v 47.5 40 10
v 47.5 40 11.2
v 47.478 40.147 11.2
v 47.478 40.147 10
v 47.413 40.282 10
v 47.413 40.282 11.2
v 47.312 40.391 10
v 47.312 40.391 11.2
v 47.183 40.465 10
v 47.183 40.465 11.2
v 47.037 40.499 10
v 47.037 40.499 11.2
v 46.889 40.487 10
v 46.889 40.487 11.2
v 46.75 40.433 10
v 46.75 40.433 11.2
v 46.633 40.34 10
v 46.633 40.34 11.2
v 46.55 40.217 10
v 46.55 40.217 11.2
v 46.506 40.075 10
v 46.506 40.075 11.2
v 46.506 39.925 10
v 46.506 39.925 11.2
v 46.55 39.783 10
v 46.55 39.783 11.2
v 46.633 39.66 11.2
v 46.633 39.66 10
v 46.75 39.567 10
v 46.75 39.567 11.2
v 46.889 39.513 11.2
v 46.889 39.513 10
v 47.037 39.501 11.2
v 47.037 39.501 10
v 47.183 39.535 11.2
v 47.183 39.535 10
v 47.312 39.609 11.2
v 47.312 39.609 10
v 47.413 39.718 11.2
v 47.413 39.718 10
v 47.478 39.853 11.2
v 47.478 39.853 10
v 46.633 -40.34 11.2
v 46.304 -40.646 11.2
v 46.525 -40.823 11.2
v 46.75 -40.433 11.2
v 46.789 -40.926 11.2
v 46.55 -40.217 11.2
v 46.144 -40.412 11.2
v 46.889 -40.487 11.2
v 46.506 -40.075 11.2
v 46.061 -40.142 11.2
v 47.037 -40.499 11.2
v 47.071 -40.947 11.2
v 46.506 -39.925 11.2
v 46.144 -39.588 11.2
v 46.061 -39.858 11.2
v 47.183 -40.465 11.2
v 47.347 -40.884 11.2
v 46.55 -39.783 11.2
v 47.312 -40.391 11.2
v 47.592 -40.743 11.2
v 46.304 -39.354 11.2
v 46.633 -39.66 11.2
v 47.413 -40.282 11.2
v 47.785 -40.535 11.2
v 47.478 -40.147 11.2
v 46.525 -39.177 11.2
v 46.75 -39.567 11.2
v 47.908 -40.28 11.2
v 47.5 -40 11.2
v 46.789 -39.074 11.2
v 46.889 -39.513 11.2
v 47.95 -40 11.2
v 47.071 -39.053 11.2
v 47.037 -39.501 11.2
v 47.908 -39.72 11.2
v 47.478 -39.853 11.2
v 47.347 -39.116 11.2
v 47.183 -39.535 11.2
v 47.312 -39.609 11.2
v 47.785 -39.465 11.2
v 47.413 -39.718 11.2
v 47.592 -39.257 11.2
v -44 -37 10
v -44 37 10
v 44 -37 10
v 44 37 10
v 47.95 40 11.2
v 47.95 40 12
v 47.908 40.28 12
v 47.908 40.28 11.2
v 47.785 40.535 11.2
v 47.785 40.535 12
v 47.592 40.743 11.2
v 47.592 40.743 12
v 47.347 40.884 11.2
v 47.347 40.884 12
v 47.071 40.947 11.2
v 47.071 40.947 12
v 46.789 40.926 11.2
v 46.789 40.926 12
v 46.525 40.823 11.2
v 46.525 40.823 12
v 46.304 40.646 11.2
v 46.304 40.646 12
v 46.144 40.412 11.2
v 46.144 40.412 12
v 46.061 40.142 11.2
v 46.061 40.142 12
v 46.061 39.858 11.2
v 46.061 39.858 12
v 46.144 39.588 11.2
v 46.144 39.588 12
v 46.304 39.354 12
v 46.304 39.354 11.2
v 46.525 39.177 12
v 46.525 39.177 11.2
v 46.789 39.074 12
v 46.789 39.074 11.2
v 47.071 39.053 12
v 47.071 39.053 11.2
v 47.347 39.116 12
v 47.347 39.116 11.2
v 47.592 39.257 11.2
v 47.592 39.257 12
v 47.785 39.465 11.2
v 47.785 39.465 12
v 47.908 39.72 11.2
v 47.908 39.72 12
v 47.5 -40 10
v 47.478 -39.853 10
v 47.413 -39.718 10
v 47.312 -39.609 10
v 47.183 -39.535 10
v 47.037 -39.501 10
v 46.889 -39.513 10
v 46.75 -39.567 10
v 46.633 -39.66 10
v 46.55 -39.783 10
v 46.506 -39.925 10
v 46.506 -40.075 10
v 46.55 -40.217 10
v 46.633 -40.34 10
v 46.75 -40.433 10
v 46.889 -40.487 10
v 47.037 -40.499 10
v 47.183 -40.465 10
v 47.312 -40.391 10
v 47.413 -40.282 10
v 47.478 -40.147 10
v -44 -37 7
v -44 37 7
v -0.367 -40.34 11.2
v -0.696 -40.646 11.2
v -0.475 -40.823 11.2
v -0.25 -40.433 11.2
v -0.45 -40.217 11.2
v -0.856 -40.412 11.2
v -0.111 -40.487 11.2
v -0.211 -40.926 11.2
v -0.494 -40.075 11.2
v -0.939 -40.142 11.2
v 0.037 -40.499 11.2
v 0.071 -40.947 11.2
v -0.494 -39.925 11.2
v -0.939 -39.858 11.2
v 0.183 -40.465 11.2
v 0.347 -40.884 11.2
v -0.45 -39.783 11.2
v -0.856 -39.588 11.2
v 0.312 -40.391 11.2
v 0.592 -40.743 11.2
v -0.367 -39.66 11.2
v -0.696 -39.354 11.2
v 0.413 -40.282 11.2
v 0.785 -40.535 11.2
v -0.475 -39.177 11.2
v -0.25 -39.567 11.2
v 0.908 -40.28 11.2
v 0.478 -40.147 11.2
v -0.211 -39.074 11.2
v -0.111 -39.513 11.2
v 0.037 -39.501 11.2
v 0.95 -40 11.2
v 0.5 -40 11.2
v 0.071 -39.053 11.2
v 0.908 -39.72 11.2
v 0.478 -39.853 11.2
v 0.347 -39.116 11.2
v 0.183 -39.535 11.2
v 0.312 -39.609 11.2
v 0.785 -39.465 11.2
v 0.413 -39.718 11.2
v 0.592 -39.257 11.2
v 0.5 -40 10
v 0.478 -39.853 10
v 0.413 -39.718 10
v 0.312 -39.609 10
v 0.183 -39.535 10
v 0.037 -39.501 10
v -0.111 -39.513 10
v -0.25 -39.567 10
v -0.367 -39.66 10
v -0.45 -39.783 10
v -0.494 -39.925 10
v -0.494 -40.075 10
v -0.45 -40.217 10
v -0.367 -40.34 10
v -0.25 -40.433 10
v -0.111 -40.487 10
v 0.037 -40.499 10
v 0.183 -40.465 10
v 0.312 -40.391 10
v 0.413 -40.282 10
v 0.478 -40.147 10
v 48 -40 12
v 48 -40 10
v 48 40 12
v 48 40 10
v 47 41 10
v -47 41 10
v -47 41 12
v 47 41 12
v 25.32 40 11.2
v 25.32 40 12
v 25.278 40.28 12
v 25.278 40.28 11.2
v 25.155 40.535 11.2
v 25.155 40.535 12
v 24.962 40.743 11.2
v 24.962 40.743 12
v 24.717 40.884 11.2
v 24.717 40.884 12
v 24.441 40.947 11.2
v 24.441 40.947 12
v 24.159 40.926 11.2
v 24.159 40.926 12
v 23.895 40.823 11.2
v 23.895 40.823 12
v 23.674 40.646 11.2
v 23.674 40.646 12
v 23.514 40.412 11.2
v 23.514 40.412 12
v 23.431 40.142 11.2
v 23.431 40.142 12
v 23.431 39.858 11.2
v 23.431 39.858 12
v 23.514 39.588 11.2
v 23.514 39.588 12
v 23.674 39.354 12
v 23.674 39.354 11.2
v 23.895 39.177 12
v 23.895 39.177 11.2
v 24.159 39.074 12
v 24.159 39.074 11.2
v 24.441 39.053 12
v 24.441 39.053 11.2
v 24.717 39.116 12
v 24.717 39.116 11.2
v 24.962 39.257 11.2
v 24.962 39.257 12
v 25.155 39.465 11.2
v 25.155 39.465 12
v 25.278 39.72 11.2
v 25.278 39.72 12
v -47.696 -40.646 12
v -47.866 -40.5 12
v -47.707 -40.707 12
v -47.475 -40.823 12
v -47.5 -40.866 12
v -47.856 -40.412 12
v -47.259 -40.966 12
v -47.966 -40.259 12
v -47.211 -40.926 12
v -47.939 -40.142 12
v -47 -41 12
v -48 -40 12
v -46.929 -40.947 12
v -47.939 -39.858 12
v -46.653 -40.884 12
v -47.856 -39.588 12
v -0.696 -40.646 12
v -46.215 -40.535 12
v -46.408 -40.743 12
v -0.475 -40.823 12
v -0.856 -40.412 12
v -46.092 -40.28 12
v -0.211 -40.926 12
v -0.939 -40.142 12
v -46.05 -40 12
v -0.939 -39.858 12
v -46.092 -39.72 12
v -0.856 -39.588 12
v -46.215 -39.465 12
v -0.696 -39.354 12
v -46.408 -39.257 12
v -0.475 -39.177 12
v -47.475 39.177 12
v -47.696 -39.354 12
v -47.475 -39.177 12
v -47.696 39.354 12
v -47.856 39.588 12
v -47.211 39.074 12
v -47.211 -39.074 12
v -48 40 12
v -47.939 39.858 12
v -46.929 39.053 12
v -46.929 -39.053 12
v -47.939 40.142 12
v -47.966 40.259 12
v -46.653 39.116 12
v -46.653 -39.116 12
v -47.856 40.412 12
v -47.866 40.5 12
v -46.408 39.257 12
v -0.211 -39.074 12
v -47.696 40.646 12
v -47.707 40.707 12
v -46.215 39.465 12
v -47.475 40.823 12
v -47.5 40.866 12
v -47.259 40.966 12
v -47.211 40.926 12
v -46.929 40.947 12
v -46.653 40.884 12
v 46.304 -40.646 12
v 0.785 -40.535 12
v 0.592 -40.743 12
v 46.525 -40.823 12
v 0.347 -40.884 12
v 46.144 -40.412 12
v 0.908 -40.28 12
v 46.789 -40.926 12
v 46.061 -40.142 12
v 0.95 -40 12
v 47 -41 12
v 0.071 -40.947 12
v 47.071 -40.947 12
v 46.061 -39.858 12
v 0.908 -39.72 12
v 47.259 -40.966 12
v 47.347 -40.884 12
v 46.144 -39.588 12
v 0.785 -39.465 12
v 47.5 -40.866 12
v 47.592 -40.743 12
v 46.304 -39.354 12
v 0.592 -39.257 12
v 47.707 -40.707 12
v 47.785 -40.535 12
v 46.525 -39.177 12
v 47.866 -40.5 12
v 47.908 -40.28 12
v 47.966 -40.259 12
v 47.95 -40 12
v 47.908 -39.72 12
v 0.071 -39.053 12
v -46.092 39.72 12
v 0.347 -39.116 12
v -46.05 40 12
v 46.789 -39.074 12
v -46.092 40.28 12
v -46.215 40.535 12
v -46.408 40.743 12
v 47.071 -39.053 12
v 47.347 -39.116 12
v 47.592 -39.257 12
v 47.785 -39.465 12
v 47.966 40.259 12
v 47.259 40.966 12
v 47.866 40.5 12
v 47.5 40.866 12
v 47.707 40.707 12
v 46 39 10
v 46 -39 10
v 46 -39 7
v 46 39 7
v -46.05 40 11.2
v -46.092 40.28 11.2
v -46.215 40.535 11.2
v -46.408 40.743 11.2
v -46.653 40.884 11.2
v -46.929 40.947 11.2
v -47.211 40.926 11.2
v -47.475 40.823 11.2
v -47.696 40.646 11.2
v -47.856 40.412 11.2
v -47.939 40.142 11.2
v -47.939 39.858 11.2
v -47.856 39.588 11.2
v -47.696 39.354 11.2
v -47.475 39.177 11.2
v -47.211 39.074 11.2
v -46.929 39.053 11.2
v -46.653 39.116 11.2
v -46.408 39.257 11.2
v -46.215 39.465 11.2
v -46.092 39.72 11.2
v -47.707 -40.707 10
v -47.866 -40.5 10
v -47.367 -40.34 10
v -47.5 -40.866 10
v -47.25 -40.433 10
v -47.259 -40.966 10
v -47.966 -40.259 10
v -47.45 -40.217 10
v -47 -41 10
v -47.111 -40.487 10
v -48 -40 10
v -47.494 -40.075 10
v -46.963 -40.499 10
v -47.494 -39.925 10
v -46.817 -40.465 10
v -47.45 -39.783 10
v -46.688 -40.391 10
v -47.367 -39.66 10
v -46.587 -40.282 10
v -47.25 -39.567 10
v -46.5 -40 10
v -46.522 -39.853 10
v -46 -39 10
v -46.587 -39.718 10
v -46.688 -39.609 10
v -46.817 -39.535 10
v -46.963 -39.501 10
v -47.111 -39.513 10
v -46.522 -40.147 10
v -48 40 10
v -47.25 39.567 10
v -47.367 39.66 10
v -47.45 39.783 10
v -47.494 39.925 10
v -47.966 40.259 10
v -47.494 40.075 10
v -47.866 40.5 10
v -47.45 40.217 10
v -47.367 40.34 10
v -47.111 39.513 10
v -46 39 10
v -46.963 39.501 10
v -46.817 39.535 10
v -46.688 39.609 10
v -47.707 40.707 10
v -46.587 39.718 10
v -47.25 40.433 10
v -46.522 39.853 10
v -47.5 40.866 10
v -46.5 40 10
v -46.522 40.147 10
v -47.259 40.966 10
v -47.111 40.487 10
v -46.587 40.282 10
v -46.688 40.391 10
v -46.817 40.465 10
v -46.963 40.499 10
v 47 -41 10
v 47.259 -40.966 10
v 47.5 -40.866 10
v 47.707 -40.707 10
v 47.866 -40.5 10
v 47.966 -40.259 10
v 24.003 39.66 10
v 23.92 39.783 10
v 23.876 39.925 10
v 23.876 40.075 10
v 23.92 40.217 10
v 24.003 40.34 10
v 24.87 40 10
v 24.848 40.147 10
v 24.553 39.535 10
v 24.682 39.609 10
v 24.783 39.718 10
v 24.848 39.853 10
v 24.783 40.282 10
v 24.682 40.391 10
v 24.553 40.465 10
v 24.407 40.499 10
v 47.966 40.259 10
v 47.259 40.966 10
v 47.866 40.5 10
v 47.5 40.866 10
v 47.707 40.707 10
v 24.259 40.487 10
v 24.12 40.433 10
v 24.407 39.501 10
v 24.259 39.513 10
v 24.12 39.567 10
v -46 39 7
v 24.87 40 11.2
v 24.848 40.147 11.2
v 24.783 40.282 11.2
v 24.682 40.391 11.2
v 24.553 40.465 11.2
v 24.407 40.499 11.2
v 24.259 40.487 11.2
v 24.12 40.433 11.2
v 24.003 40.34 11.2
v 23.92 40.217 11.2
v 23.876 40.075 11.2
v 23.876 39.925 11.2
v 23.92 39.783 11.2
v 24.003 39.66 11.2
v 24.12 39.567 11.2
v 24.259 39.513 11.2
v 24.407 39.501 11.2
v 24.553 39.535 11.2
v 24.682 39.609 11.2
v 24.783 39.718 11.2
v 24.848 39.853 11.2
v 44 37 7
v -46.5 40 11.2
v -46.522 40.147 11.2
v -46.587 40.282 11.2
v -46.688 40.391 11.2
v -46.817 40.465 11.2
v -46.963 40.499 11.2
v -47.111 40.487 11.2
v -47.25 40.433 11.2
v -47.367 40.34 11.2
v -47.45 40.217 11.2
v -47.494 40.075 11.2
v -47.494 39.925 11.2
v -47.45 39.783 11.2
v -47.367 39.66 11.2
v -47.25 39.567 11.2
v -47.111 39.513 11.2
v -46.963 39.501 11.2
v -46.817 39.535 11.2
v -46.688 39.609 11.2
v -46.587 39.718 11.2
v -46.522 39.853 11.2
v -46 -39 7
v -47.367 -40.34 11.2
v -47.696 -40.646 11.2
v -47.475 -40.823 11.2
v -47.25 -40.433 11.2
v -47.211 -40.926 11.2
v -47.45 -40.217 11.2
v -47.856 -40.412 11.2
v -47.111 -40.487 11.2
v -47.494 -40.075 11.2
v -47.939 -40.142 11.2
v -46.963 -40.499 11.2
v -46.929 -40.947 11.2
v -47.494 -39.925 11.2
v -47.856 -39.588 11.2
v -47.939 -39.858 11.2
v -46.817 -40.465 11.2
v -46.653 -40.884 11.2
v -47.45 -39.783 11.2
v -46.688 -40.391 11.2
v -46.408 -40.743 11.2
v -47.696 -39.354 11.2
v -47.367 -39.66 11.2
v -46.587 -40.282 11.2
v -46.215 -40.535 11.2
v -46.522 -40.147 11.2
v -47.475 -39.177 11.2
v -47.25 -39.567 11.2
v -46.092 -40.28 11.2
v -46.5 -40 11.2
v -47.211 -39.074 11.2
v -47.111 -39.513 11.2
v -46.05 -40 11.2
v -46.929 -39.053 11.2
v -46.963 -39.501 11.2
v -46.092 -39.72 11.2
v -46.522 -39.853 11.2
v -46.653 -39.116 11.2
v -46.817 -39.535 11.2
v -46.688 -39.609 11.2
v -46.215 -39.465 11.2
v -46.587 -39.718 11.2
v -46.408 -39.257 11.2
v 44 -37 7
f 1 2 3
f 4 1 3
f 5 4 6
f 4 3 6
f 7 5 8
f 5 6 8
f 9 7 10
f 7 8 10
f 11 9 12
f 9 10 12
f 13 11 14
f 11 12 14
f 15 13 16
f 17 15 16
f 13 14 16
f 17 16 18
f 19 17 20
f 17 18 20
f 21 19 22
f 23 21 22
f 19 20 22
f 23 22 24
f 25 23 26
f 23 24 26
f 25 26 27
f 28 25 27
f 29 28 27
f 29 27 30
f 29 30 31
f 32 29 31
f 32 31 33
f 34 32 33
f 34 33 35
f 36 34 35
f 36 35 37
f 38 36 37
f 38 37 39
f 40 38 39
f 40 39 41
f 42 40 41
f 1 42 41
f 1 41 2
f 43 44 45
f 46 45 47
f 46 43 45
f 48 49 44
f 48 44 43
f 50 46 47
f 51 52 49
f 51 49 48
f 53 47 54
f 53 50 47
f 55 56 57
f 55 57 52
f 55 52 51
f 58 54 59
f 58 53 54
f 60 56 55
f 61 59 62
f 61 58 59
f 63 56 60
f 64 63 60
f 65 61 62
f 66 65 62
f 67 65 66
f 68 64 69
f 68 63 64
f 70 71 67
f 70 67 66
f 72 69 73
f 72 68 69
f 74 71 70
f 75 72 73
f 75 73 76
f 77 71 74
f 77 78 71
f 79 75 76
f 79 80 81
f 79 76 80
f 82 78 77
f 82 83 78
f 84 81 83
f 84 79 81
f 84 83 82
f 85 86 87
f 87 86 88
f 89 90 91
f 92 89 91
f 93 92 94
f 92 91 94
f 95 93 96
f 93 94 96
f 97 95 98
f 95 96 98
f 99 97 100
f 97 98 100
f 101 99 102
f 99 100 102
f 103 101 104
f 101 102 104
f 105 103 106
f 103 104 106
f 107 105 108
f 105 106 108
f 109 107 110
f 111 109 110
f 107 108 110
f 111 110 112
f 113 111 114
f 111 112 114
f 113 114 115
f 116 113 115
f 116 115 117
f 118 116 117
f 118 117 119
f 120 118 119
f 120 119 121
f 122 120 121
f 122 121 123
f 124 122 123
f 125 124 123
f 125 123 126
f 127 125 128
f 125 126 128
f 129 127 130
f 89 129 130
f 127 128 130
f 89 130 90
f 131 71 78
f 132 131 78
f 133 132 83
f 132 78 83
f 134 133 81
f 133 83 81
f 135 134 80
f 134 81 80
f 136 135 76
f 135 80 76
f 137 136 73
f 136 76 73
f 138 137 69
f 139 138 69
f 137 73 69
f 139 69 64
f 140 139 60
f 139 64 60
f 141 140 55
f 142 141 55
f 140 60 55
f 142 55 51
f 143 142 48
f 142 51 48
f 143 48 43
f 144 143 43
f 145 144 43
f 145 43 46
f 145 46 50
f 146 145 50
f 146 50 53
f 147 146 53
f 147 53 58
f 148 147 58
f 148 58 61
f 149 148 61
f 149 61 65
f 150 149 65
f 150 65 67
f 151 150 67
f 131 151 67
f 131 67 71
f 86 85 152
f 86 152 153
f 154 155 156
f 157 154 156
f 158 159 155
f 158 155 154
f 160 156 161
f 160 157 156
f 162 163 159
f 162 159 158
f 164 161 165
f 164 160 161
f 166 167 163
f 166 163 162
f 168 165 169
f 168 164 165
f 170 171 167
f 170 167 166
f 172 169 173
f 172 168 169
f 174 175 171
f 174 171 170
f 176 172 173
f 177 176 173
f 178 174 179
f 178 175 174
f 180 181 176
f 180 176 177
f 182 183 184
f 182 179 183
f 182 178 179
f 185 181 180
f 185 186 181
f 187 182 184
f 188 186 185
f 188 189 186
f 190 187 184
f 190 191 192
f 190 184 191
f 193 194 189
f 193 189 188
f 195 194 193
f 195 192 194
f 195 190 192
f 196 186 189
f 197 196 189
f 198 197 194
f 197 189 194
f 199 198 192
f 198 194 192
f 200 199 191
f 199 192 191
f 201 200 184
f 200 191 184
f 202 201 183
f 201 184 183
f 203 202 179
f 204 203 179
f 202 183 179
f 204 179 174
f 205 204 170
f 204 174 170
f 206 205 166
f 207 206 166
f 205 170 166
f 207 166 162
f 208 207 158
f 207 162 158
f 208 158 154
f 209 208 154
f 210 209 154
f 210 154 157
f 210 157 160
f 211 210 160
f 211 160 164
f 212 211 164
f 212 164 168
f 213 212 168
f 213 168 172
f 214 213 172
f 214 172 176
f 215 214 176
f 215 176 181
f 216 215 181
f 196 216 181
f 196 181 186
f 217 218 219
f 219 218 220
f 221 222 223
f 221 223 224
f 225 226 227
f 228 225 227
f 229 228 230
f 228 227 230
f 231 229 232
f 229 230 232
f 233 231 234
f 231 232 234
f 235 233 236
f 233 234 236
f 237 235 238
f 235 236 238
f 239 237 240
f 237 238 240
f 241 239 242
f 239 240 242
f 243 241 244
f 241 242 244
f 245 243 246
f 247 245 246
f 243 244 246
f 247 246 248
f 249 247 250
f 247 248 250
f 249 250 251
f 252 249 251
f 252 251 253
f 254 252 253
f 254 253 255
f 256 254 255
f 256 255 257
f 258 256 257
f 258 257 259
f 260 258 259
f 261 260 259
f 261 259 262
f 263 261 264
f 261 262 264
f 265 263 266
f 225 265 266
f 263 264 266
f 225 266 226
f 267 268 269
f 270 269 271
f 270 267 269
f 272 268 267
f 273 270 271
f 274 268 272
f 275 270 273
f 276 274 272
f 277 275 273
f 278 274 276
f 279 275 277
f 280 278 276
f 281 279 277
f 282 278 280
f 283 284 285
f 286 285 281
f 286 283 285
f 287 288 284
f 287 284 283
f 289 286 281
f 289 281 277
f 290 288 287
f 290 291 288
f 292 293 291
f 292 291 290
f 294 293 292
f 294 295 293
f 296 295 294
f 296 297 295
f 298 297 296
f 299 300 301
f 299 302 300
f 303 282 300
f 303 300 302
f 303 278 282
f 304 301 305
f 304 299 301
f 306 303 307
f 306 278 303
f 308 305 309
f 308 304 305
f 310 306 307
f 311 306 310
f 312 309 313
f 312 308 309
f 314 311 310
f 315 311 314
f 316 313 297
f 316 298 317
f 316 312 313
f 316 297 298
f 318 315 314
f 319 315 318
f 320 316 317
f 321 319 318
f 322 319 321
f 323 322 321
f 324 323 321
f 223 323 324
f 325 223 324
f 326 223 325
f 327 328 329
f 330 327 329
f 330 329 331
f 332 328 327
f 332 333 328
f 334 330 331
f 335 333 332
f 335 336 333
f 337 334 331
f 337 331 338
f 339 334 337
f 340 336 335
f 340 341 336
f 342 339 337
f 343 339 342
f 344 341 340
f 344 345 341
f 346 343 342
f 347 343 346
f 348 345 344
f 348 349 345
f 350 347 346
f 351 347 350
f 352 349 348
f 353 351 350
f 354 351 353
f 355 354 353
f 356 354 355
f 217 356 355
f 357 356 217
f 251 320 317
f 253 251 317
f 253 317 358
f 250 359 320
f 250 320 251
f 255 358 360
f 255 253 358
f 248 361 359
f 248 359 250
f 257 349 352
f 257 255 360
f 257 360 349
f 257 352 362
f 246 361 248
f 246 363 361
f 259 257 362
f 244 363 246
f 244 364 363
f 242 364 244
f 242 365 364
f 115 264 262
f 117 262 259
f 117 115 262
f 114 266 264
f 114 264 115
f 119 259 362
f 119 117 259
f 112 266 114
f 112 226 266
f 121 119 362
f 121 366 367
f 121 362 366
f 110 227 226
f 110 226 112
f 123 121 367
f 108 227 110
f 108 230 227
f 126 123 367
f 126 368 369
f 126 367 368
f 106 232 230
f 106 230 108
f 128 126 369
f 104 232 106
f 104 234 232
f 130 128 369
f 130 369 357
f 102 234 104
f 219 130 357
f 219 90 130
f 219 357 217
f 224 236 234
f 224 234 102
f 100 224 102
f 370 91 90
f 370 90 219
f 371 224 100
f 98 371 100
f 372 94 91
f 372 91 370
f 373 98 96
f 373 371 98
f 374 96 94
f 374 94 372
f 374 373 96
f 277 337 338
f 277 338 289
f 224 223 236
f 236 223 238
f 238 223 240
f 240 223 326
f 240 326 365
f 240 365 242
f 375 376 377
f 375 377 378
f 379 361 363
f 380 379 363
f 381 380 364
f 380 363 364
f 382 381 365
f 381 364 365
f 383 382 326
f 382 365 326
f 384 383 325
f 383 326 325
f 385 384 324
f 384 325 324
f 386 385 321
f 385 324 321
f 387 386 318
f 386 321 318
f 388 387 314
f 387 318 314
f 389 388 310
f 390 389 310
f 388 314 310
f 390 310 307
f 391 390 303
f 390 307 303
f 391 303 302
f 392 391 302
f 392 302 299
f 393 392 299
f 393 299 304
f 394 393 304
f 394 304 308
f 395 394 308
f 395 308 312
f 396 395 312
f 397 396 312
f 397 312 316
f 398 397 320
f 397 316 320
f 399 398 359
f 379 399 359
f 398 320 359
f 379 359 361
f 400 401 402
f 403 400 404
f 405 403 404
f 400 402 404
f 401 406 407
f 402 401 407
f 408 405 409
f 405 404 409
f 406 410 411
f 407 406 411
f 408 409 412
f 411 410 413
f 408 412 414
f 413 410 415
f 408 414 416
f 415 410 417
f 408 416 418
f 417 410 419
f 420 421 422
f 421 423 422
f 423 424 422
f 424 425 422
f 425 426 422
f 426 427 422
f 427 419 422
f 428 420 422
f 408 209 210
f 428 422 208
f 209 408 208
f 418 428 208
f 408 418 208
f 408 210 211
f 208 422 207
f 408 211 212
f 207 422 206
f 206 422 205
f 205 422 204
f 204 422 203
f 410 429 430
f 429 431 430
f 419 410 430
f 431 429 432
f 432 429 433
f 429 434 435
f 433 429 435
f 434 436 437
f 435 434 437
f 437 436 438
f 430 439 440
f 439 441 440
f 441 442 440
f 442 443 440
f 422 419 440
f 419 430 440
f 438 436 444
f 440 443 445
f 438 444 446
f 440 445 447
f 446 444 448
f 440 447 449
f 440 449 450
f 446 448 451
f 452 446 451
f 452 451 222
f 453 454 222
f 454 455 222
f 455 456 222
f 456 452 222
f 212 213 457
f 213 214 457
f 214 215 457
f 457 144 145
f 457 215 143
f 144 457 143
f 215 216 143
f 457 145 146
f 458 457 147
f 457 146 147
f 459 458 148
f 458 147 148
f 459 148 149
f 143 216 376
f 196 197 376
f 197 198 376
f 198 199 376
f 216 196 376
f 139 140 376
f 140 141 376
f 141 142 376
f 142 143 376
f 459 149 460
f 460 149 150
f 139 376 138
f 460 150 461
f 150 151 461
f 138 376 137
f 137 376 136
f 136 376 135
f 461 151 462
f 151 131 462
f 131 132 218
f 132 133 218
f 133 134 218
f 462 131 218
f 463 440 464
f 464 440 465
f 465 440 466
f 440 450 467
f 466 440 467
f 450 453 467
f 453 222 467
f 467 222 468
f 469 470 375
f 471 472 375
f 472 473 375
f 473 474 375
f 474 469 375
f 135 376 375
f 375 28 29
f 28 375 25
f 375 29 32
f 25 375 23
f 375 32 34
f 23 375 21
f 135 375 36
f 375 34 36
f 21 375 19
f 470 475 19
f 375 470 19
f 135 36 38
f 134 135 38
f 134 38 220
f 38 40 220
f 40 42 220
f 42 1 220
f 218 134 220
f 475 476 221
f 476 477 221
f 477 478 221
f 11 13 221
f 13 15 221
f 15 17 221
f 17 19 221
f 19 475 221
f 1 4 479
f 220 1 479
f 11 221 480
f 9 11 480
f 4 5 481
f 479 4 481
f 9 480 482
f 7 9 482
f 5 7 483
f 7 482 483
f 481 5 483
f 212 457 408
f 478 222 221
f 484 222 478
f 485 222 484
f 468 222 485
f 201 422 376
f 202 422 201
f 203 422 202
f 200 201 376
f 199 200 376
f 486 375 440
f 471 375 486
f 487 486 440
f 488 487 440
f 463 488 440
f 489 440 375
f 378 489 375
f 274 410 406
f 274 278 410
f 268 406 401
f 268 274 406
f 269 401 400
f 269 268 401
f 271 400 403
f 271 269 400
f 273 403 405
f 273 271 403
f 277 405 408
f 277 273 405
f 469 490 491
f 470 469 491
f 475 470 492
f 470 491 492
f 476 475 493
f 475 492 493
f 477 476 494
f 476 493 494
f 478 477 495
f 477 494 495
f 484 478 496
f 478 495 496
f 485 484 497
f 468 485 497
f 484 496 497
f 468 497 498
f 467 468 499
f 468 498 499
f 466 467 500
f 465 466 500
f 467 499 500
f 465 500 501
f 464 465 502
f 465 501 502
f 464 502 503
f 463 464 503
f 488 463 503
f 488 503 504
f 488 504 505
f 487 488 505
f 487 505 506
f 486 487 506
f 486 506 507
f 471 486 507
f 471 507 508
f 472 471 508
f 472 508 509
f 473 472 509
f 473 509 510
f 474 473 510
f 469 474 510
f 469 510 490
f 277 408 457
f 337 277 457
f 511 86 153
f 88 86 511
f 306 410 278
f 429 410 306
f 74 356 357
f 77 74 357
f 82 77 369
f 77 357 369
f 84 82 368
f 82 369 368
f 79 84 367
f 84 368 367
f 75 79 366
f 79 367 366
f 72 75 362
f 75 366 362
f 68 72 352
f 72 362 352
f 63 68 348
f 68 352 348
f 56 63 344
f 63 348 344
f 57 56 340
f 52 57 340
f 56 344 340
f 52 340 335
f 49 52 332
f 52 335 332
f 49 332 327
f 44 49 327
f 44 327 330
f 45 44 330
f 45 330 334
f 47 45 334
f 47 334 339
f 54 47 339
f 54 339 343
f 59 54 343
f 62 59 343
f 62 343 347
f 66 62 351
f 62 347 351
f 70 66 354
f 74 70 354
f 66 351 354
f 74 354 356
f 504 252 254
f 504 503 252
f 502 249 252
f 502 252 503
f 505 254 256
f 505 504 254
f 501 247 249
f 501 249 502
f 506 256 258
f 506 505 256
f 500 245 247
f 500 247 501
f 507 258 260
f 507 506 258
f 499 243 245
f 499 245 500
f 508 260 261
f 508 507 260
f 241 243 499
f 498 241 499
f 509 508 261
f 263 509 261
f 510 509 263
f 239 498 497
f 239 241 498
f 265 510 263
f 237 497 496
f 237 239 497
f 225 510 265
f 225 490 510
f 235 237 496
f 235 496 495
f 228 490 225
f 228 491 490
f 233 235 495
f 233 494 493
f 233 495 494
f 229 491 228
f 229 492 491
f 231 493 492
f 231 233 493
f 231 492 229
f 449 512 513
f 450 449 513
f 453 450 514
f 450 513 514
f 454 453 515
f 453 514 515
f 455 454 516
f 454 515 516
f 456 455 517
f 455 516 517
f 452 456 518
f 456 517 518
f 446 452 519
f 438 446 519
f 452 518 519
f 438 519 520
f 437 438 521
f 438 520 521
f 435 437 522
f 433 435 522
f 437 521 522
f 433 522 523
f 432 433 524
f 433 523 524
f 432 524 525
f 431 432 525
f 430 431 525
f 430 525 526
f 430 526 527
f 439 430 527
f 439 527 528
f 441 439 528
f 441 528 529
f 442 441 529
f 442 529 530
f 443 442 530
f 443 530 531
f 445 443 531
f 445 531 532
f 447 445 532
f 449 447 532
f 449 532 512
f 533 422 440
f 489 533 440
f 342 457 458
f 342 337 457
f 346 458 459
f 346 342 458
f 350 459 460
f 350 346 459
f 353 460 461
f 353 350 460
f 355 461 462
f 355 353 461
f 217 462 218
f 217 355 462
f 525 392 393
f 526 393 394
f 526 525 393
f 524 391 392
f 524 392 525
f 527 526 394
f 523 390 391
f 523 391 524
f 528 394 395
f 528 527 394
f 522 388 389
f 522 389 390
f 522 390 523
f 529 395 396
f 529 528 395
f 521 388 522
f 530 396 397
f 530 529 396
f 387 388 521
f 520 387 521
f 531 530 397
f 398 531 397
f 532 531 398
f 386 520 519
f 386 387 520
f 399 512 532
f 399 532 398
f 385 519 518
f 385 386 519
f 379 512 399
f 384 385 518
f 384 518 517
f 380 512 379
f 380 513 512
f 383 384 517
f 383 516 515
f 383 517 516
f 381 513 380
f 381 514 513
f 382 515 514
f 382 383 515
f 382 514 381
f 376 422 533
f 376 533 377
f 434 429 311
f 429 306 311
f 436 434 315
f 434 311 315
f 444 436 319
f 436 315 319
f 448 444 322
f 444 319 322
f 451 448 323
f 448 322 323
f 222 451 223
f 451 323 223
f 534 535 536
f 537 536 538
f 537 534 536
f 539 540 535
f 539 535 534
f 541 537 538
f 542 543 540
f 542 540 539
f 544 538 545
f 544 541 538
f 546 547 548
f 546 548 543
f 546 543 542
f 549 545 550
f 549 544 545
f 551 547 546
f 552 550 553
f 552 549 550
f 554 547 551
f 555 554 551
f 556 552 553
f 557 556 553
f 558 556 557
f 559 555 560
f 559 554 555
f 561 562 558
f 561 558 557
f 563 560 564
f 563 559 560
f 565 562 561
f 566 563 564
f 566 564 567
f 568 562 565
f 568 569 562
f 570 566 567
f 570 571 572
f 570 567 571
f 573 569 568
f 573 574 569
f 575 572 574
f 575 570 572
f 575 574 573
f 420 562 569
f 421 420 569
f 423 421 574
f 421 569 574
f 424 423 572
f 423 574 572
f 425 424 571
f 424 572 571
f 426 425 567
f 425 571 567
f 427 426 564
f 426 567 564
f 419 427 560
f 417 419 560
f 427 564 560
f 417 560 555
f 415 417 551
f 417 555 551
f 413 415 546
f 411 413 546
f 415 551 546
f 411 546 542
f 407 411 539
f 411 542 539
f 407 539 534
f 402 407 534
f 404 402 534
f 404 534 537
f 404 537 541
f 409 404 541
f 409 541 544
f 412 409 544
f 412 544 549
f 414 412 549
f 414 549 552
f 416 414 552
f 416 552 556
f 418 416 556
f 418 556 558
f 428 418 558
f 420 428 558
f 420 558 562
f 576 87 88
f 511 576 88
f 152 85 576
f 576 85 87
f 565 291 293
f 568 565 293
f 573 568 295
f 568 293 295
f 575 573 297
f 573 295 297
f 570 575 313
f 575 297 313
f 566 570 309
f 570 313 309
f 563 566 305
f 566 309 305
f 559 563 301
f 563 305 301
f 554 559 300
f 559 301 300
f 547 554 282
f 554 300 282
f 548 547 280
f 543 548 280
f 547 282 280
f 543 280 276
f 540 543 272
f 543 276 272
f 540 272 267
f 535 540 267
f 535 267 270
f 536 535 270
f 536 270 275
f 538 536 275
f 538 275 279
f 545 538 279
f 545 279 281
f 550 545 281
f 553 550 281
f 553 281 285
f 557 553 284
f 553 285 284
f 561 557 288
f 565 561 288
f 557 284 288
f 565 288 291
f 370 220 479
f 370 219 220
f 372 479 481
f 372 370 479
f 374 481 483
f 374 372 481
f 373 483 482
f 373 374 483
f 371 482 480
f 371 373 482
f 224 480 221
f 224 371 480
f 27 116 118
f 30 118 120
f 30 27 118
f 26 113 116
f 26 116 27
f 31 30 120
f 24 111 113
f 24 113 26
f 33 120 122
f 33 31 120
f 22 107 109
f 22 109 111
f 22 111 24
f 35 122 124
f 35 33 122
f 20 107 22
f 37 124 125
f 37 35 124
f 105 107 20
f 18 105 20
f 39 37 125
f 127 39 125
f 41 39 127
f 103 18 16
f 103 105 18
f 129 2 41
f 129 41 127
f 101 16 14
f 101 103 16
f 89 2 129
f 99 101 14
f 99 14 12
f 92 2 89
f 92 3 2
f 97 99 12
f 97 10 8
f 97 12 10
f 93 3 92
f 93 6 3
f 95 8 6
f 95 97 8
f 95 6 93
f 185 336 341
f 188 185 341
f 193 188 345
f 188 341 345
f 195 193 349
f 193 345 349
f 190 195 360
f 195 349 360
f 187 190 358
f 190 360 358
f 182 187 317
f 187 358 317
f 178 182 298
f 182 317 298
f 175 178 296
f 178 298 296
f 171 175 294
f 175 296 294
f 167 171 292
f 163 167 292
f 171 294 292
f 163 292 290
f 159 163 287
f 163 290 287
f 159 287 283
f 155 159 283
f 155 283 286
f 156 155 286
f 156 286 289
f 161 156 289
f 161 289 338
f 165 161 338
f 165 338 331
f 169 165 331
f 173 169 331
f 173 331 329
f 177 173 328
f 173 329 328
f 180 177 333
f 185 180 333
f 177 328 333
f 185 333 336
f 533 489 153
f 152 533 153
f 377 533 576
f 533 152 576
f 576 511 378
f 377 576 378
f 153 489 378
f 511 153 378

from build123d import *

# Parameters (mm, degrees)
SKETCH009_R      = 0.5
EXTRUDE011_DEPTH = 8
SKETCH010_R      = 0.95
EXTRUDE010_DEPTH = 0.8
SKETCH008_W      = 96
SKETCH008_H      = 82
EXTRUDE009_DEPTH = 2
FILLET004_R      = 1
SKETCH007_W      = 92
SKETCH007_H      = 78
SKETCH007_W_2    = 88
SKETCH007_H_2    = 74
EXTRUDE008_DEPTH = 3


with BuildPart() as extrude011:
    # Sketch009 (on Face5 of Fusion002) → Extrude011 (new body)
    with BuildSketch(Plane.XY.offset(12)):
        with Locations((24.37, 40)):
            Circle(SKETCH009_R)
        with Locations((0, -40)):
            Circle(SKETCH009_R)
        with Locations((47, -40)):
            Circle(SKETCH009_R)
        with Locations((-47, -40)):
            Circle(SKETCH009_R)
        with Locations((-47, 40)):
            Circle(SKETCH009_R)
        with Locations((47, 40)):
            Circle(SKETCH009_R)
    extrude(amount=-EXTRUDE011_DEPTH)


with BuildPart() as fusion004:
    # Sketch010 (on Face5 of Fusion002) → Extrude010 (new body)
    with BuildSketch(Plane.XY.offset(12)):
        with Locations((24.37, 40)):
            Circle(SKETCH010_R)
        with Locations((0, -40)):
            Circle(SKETCH010_R)
        with Locations((47, -40)):
            Circle(SKETCH010_R)
        with Locations((-47, -40)):
            Circle(SKETCH010_R)
        with Locations((-47, 40)):
            Circle(SKETCH010_R)
        with Locations((47, 40)):
            Circle(SKETCH010_R)
    extrude(amount=-EXTRUDE010_DEPTH)

    # Fusion004: union Extrude011
    add(extrude011.part)


with BuildPart() as fillet004:
    # Sketch008 (on Face5 of Fusion001) → Extrude009 (new body)
    with BuildSketch(Plane.XY.offset(10)):
        Rectangle(SKETCH008_W, SKETCH008_H)
    extrude(amount=EXTRUDE009_DEPTH)

    # Fillet004
    fillet004_edges = [fillet004.edges().sort_by_distance(p)[0] for p in [
        (-48, 41, 11),
        (48, 41, 11),
        (48, -41, 11),
        (-48, -41, 11),
    ]]
    fillet(fillet004_edges, radius=FILLET004_R)


with BuildPart() as under001:
    # Sketch007 (on Face5 of Fusion001) → Extrude008 (new body)
    with BuildSketch(Plane.XY.offset(10)):
        Rectangle(SKETCH007_W, SKETCH007_H)
        Rectangle(SKETCH007_W_2, SKETCH007_H_2, mode=Mode.SUBTRACT)
    extrude(amount=-EXTRUDE008_DEPTH)

    # Fusion002: union Fillet004
    add(fillet004.part)

    # Cut004: cut Fusion004
    add(fusion004.part, mode=Mode.SUBTRACT)


solid = under001.part
